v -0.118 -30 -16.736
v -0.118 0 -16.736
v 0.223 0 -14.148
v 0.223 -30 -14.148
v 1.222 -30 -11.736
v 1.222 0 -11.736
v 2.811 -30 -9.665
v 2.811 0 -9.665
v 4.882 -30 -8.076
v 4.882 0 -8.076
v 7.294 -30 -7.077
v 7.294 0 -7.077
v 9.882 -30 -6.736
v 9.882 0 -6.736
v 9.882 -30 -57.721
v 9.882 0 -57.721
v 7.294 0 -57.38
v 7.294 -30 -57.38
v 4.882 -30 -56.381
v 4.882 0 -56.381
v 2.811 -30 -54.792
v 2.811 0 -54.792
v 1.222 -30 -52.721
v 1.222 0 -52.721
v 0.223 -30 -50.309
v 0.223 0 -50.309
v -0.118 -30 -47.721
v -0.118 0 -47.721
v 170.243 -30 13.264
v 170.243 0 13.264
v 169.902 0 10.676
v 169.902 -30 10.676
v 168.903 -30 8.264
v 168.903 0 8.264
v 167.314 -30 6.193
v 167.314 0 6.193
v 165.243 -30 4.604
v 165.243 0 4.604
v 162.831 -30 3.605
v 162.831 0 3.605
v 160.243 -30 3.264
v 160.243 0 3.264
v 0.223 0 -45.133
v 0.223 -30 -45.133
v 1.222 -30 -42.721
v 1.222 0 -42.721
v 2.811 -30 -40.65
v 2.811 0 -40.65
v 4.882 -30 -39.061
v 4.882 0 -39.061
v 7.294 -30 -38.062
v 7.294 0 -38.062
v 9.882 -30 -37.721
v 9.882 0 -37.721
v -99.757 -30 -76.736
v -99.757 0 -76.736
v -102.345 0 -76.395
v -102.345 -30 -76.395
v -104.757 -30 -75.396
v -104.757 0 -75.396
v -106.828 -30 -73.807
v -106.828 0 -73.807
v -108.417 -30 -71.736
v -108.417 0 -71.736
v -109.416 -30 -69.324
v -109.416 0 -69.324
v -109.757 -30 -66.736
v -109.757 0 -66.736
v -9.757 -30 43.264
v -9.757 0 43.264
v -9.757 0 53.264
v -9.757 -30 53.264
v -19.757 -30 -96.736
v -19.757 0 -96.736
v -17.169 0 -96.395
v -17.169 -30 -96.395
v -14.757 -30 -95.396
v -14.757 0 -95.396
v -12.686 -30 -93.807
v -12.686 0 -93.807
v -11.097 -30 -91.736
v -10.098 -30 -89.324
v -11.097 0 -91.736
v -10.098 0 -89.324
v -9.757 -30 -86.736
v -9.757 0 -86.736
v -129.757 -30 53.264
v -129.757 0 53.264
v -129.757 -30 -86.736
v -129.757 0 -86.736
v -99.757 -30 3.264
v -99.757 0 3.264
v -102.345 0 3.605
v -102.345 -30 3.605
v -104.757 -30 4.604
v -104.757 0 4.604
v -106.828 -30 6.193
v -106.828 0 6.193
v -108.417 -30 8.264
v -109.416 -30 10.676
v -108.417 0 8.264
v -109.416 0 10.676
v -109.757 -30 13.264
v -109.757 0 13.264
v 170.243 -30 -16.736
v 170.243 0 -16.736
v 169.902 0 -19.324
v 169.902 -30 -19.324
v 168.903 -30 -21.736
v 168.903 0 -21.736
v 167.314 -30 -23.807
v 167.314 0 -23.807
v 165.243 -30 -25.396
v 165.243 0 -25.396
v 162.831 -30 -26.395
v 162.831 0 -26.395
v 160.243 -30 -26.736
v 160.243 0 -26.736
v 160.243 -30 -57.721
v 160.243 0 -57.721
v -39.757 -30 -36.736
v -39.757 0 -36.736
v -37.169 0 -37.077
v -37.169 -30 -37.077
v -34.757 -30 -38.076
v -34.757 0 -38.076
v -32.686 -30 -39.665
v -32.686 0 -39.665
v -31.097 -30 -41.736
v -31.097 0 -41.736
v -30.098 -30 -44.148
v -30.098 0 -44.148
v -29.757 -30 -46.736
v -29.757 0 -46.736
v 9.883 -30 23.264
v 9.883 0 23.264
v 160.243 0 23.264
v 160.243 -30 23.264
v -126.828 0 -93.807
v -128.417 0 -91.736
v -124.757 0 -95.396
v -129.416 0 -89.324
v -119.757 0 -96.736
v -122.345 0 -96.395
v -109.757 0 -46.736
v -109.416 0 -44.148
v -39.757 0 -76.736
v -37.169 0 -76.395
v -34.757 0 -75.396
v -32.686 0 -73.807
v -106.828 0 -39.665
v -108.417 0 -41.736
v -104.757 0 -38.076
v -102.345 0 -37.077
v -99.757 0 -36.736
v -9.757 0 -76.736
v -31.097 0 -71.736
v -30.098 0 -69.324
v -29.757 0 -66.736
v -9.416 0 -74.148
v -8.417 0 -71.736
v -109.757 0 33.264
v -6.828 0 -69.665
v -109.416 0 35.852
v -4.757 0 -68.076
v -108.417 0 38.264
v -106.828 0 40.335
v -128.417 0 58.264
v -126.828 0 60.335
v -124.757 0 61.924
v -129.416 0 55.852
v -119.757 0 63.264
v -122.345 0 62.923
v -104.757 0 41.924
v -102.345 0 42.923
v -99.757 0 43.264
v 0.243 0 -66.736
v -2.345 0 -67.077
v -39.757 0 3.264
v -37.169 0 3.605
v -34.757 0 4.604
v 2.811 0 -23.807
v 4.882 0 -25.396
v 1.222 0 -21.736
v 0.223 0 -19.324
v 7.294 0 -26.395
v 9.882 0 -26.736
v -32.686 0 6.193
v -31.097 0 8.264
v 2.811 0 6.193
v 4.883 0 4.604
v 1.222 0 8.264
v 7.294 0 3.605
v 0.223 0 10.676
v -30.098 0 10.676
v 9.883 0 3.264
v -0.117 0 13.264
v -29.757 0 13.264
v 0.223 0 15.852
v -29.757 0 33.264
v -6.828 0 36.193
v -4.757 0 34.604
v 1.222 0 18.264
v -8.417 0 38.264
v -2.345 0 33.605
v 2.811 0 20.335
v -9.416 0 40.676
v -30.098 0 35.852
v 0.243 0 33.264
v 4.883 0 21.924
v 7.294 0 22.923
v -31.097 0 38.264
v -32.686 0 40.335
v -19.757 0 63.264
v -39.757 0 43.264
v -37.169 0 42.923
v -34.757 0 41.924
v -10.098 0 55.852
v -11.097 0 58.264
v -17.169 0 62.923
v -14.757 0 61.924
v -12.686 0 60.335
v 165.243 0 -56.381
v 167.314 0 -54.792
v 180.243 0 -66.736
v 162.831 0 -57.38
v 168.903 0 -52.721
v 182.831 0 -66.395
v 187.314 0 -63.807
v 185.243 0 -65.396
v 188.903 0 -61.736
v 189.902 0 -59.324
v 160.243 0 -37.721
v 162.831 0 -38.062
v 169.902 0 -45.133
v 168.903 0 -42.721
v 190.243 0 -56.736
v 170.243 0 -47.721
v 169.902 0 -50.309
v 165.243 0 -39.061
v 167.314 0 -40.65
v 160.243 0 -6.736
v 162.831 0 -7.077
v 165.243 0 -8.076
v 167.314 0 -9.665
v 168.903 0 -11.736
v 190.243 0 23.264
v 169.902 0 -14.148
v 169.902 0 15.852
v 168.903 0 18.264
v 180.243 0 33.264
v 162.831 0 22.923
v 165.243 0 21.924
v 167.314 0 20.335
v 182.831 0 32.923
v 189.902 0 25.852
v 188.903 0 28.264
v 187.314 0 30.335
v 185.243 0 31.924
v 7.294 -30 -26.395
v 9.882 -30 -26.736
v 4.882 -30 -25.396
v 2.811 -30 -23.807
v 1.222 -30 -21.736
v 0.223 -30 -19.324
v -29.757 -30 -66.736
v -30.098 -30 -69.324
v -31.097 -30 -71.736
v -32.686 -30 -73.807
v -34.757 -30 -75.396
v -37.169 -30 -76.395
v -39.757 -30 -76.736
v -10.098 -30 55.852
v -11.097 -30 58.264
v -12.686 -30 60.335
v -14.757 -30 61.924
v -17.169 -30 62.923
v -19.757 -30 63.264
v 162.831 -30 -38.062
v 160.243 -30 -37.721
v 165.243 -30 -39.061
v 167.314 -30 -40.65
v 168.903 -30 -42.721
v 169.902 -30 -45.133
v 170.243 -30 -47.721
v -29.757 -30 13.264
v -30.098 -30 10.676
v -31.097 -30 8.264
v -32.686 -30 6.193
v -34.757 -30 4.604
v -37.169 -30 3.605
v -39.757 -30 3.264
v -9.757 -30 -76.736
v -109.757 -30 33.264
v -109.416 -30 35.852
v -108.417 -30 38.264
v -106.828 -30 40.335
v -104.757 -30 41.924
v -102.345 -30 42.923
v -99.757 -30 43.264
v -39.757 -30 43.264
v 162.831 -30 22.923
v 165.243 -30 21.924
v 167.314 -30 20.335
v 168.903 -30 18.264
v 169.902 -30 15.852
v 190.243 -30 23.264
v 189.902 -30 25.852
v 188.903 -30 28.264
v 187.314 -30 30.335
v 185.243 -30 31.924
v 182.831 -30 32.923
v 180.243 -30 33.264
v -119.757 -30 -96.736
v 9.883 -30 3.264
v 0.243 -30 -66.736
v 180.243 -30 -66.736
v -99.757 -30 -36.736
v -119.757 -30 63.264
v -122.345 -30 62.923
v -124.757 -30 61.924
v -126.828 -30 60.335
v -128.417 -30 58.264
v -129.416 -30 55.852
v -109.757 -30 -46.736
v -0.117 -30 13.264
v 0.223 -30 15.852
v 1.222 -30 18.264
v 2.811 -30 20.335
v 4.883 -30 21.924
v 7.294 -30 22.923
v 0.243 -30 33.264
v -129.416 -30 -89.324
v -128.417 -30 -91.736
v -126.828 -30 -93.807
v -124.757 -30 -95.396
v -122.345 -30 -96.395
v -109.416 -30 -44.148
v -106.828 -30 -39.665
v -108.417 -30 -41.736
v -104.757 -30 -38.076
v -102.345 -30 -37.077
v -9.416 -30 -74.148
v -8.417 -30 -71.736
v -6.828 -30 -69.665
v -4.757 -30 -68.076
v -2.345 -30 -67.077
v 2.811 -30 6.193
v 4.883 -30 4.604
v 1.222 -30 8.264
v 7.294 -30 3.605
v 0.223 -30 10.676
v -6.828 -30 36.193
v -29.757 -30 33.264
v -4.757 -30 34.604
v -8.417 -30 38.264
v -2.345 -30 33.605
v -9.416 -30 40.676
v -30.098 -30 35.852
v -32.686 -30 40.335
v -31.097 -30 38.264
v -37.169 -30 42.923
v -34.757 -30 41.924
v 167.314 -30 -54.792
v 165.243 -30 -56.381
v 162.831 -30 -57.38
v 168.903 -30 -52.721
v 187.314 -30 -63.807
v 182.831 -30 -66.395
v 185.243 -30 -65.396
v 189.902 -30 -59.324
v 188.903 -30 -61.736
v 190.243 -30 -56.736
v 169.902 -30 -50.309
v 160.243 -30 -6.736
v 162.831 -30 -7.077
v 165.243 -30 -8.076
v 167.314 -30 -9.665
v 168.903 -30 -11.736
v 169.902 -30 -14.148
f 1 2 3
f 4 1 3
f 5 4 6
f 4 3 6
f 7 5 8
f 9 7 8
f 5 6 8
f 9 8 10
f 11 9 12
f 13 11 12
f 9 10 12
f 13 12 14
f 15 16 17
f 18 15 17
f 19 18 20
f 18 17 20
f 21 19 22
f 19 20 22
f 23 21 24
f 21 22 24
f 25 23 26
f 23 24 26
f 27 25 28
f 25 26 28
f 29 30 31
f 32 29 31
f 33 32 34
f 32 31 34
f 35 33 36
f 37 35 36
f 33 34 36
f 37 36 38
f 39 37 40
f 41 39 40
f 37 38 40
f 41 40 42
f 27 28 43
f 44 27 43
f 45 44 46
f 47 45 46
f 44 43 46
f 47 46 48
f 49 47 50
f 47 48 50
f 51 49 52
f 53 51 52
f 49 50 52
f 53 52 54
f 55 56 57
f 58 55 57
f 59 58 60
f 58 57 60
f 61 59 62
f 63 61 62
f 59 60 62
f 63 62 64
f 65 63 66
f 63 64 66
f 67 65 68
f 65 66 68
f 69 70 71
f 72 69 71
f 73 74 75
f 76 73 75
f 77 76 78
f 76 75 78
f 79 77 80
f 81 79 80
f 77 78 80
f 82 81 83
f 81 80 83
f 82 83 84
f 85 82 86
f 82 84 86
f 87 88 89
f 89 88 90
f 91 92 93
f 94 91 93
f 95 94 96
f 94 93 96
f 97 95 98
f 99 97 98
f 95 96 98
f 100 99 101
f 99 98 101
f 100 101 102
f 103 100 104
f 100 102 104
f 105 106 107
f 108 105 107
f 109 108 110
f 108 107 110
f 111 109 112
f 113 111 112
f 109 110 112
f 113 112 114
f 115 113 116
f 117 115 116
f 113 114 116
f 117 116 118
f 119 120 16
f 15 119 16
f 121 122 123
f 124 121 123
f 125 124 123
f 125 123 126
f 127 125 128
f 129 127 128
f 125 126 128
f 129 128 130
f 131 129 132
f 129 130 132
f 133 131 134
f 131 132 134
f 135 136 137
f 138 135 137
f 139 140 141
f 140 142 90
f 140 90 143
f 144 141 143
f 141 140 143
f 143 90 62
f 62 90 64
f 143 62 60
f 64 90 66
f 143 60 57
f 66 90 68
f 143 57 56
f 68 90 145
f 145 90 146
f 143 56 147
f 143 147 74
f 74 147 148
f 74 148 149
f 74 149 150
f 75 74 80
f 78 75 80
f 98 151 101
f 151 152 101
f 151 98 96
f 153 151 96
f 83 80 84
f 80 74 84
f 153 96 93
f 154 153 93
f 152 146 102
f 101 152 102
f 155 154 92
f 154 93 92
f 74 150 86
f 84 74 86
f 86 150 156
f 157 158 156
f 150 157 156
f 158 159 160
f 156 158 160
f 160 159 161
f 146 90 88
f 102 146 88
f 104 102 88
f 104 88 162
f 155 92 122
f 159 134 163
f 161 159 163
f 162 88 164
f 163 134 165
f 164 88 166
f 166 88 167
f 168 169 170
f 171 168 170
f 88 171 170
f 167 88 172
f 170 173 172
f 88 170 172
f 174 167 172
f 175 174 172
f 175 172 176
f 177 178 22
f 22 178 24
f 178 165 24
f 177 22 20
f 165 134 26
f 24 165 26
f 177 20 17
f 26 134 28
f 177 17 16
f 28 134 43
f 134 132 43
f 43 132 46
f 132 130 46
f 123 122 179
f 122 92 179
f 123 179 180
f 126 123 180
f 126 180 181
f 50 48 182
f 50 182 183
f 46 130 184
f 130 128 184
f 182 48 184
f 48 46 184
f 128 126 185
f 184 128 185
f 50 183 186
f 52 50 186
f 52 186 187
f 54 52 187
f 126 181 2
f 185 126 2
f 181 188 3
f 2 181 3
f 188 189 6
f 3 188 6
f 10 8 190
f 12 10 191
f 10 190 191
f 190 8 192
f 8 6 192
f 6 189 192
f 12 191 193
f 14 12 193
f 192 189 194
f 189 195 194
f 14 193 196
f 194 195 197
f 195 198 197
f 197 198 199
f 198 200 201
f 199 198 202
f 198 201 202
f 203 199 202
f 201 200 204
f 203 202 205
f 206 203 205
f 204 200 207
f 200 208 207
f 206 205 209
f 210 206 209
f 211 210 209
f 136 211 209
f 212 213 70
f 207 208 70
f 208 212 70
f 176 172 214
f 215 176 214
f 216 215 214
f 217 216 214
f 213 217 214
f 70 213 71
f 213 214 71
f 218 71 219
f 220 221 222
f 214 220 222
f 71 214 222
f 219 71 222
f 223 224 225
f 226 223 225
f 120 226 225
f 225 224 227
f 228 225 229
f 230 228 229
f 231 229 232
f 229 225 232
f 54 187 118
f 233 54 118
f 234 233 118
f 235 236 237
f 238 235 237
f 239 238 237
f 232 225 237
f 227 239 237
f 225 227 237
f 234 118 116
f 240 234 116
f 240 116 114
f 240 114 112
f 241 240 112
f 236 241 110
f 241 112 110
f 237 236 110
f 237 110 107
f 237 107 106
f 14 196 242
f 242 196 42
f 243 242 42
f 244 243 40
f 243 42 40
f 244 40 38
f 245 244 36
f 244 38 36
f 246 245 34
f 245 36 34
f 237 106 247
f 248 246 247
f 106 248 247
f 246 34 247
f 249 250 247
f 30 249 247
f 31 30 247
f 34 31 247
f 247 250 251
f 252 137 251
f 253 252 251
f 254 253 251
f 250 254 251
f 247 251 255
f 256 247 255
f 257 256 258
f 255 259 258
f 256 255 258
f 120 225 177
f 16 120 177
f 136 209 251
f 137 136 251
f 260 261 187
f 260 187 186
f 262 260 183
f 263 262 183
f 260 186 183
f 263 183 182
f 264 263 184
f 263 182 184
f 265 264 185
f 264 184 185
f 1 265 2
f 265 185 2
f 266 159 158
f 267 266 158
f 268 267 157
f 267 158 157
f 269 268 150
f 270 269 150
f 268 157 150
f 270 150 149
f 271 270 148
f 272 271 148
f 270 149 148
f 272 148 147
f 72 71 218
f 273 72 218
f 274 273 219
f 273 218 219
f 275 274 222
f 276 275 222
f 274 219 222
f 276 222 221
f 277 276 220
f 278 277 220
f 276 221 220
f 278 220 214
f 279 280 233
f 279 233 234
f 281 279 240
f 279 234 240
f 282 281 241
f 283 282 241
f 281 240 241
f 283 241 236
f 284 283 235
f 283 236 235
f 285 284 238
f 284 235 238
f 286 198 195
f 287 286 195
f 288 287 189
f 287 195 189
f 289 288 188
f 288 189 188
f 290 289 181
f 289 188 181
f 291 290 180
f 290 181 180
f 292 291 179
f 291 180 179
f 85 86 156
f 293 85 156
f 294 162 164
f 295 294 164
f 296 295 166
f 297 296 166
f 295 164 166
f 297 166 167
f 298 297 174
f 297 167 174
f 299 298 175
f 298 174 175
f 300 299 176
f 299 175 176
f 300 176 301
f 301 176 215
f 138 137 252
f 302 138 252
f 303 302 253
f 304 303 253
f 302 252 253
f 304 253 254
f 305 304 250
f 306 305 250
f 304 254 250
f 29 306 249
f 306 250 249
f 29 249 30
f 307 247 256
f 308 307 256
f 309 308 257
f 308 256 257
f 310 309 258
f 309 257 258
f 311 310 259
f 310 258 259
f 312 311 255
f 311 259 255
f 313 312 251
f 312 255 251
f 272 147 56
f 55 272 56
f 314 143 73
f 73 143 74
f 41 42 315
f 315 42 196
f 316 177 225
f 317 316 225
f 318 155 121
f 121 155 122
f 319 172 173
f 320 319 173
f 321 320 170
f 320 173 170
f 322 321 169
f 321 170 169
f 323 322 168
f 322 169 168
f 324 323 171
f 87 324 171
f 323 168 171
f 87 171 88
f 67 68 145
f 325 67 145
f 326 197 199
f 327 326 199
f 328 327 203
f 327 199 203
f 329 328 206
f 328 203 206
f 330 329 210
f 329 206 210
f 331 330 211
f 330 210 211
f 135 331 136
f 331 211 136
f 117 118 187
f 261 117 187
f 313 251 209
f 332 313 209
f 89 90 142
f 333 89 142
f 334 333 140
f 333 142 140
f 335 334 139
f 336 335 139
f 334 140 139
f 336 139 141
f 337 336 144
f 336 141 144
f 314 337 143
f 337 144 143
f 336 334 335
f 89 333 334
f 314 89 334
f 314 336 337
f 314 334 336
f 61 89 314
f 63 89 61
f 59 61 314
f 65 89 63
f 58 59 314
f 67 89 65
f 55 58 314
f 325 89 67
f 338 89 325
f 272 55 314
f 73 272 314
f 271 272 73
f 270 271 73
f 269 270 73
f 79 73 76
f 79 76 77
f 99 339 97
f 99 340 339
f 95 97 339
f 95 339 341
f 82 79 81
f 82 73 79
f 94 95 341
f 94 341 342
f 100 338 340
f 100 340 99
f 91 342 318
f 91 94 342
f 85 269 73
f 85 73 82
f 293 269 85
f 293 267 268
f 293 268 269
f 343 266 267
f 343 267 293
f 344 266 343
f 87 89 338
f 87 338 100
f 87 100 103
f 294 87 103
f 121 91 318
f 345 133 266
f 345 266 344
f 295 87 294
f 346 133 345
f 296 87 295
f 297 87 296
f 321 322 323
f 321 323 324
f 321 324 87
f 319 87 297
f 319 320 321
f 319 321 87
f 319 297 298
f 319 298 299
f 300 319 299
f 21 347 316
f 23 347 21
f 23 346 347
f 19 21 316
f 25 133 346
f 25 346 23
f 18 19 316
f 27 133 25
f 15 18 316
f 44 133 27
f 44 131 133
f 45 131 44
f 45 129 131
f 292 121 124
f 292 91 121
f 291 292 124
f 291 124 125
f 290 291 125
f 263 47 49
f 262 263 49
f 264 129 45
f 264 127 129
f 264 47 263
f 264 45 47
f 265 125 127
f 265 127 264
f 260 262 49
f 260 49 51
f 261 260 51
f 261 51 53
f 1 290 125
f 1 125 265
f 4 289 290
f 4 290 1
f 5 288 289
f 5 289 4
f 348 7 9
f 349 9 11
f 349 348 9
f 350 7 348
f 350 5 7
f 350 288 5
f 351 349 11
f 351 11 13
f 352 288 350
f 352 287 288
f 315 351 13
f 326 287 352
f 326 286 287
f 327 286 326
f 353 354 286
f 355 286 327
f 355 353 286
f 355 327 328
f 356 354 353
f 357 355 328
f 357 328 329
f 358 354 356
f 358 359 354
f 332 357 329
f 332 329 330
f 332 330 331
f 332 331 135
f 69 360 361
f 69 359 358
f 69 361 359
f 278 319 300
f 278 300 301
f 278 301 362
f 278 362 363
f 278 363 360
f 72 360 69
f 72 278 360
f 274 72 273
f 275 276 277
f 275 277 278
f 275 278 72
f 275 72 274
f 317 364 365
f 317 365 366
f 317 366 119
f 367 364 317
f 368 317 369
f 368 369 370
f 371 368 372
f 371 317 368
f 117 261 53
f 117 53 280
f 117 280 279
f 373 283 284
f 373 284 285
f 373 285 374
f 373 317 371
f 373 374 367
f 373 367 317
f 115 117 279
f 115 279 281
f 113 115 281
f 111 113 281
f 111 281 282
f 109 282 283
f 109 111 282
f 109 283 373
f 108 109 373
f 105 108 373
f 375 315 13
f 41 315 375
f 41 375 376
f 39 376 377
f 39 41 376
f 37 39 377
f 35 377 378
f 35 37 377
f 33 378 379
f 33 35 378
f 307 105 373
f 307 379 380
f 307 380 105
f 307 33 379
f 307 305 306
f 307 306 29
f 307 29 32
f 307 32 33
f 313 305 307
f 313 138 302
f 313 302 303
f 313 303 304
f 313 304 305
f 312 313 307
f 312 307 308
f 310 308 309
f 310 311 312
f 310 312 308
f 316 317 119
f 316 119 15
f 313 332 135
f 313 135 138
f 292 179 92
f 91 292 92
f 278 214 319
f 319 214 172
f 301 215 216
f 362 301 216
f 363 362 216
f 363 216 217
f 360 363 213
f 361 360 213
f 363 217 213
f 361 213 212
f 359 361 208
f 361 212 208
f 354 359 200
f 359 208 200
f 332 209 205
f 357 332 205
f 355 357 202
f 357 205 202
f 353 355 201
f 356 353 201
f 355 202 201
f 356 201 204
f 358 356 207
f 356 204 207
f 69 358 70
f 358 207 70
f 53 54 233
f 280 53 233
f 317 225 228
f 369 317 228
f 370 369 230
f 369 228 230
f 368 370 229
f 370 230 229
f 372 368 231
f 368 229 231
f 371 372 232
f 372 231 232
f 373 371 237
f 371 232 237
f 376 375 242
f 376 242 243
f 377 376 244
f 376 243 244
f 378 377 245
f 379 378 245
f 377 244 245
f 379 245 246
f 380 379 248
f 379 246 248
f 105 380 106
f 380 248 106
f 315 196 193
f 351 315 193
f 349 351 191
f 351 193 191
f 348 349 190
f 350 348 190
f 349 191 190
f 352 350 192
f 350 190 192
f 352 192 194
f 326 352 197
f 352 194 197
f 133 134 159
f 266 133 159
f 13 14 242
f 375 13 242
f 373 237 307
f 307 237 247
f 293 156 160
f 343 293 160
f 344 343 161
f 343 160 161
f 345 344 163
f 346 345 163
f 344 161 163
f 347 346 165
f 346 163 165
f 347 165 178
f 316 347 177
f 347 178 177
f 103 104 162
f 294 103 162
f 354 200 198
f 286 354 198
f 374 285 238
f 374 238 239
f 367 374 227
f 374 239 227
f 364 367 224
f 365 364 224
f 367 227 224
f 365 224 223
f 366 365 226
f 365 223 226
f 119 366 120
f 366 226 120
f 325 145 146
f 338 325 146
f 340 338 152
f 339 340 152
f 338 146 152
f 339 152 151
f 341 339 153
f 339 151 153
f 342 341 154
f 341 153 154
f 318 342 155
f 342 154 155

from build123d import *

# Parameters (mm, degrees)
F1_DEPTH = 30


with BuildPart() as f1:
    # F0 (on Front) → F1 (new body)
    with BuildSketch(Plane.XZ):
        with BuildLine():
            Line((-19.756784, 63.263963), (-119.756784, 63.263963))
            ThreePointArc((-119.756784, 63.263963), (-126.827851, 60.335031), (-129.756784, 53.263963))
            Line((-129.756784, 53.263963), (-129.756784, -86.736037))
            ThreePointArc((-129.756784, -86.736037), (-126.827851, -93.807104), (-119.756784, -96.736037))
            Line((-119.756784, -96.736037), (-19.756784, -96.736037))
            ThreePointArc((-19.756784, -96.736037), (-12.685716, -93.807104), (-9.756784, -86.736037))
            Line((-9.756784, -86.736037), (-9.756784, -76.736037))
            ThreePointArc((-9.756784, -76.736037), (-6.827851, -69.664969), (0.243216, -66.736037))
            Line((0.243216, -66.736037), (180.243216, -66.736037))
            ThreePointArc((180.243216, -66.736037), (187.314284, -63.807104), (190.243216, -56.736037))
            Line((190.243216, -56.736037), (190.243216, 23.263963))
            ThreePointArc((190.243216, 23.263963), (187.314284, 30.335031), (180.243216, 33.263963))
            Line((180.243216, 33.263963), (0.243216, 33.263963))
            ThreePointArc((0.243216, 33.263963), (-6.827851, 36.192896), (-9.756784, 43.263963))
            Line((-9.756784, 43.263963), (-9.756784, 53.263963))
            ThreePointArc((-9.756784, 53.263963), (-12.685716, 60.335031), (-19.756784, 63.263963))
        make_face()
        with BuildLine():
            ThreePointArc((-109.756784, -46.736037), (-106.827851, -39.664969), (-99.756784, -36.736037))
            Line((-99.756784, -36.736037), (-39.756784, -36.736037))
            ThreePointArc((-39.756784, -36.736037), (-32.685716, -39.664969), (-29.756784, -46.736037))
            Line((-29.756784, -46.736037), (-29.756784, -66.736037))
            ThreePointArc((-29.756784, -66.736037), (-32.685716, -73.807104), (-39.756784, -76.736037))
            Line((-39.756784, -76.736037), (-99.756784, -76.736037))
            ThreePointArc((-99.756784, -76.736037), (-106.827851, -73.807104), (-109.756784, -66.736037))
            Line((-109.756784, -66.736037), (-109.756784, -46.736037))
        make_face(mode=Mode.SUBTRACT)
        with BuildLine():
            ThreePointArc((-0.117784, -47.720788), (2.811149, -40.64972), (9.882216, -37.720788))
            Line((9.882216, -37.720788), (160.243216, -37.720788))
            ThreePointArc((160.243216, -37.720788), (167.314284, -40.64972), (170.243216, -47.720788))
            ThreePointArc((170.243216, -47.720788), (167.314284, -54.791856), (160.243216, -57.720788))
            Line((160.243216, -57.720788), (9.882216, -57.720788))
            ThreePointArc((9.882216, -57.720788), (2.811149, -54.791856), (-0.117784, -47.720788))
        make_face(mode=Mode.SUBTRACT)
        with BuildLine():
            ThreePointArc((-109.756784, 33.263963), (-106.827851, 40.335031), (-99.756784, 43.263963))
            Line((-99.756784, 43.263963), (-39.756784, 43.263963))
            ThreePointArc((-39.756784, 43.263963), (-32.685716, 40.335031), (-29.756784, 33.263963))
            Line((-29.756784, 33.263963), (-29.756784, 13.263963))
            ThreePointArc((-29.756784, 13.263963), (-32.685716, 6.192896), (-39.756784, 3.263963))
            Line((-39.756784, 3.263963), (-99.756784, 3.263963))
            ThreePointArc((-99.756784, 3.263963), (-106.827851, 6.192896), (-109.756784, 13.263963))
            Line((-109.756784, 13.263963), (-109.756784, 33.263963))
        make_face(mode=Mode.SUBTRACT)
        with BuildLine():
            ThreePointArc((-0.117784, -16.736037), (2.811149, -9.664969), (9.882216, -6.736037))
            Line((9.882216, -6.736037), (160.243216, -6.736037))
            ThreePointArc((160.243216, -6.736037), (167.314284, -9.664969), (170.243216, -16.736037))
            ThreePointArc((170.243216, -16.736037), (167.314284, -23.807104), (160.243216, -26.736037))
            Line((160.243216, -26.736037), (9.882216, -26.736037))
            ThreePointArc((9.882216, -26.736037), (2.811149, -23.807104), (-0.117784, -16.736037))
        make_face(mode=Mode.SUBTRACT)
        with BuildLine():
            ThreePointArc((-0.117468, 13.263963), (2.811464, 20.335031), (9.882532, 23.263963))
            Line((9.882532, 23.263963), (160.243216, 23.263963))
            ThreePointArc((160.243216, 23.263963), (167.314284, 20.335031), (170.243216, 13.263963))
            ThreePointArc((170.243216, 13.263963), (167.314284, 6.192896), (160.243216, 3.263963))
            Line((160.243216, 3.263963), (9.882532, 3.263963))
            ThreePointArc((9.882532, 3.263963), (2.811464, 6.192896), (-0.117468, 13.263963))
        make_face(mode=Mode.SUBTRACT)
    extrude(amount=F1_DEPTH)


solid = f1.part
